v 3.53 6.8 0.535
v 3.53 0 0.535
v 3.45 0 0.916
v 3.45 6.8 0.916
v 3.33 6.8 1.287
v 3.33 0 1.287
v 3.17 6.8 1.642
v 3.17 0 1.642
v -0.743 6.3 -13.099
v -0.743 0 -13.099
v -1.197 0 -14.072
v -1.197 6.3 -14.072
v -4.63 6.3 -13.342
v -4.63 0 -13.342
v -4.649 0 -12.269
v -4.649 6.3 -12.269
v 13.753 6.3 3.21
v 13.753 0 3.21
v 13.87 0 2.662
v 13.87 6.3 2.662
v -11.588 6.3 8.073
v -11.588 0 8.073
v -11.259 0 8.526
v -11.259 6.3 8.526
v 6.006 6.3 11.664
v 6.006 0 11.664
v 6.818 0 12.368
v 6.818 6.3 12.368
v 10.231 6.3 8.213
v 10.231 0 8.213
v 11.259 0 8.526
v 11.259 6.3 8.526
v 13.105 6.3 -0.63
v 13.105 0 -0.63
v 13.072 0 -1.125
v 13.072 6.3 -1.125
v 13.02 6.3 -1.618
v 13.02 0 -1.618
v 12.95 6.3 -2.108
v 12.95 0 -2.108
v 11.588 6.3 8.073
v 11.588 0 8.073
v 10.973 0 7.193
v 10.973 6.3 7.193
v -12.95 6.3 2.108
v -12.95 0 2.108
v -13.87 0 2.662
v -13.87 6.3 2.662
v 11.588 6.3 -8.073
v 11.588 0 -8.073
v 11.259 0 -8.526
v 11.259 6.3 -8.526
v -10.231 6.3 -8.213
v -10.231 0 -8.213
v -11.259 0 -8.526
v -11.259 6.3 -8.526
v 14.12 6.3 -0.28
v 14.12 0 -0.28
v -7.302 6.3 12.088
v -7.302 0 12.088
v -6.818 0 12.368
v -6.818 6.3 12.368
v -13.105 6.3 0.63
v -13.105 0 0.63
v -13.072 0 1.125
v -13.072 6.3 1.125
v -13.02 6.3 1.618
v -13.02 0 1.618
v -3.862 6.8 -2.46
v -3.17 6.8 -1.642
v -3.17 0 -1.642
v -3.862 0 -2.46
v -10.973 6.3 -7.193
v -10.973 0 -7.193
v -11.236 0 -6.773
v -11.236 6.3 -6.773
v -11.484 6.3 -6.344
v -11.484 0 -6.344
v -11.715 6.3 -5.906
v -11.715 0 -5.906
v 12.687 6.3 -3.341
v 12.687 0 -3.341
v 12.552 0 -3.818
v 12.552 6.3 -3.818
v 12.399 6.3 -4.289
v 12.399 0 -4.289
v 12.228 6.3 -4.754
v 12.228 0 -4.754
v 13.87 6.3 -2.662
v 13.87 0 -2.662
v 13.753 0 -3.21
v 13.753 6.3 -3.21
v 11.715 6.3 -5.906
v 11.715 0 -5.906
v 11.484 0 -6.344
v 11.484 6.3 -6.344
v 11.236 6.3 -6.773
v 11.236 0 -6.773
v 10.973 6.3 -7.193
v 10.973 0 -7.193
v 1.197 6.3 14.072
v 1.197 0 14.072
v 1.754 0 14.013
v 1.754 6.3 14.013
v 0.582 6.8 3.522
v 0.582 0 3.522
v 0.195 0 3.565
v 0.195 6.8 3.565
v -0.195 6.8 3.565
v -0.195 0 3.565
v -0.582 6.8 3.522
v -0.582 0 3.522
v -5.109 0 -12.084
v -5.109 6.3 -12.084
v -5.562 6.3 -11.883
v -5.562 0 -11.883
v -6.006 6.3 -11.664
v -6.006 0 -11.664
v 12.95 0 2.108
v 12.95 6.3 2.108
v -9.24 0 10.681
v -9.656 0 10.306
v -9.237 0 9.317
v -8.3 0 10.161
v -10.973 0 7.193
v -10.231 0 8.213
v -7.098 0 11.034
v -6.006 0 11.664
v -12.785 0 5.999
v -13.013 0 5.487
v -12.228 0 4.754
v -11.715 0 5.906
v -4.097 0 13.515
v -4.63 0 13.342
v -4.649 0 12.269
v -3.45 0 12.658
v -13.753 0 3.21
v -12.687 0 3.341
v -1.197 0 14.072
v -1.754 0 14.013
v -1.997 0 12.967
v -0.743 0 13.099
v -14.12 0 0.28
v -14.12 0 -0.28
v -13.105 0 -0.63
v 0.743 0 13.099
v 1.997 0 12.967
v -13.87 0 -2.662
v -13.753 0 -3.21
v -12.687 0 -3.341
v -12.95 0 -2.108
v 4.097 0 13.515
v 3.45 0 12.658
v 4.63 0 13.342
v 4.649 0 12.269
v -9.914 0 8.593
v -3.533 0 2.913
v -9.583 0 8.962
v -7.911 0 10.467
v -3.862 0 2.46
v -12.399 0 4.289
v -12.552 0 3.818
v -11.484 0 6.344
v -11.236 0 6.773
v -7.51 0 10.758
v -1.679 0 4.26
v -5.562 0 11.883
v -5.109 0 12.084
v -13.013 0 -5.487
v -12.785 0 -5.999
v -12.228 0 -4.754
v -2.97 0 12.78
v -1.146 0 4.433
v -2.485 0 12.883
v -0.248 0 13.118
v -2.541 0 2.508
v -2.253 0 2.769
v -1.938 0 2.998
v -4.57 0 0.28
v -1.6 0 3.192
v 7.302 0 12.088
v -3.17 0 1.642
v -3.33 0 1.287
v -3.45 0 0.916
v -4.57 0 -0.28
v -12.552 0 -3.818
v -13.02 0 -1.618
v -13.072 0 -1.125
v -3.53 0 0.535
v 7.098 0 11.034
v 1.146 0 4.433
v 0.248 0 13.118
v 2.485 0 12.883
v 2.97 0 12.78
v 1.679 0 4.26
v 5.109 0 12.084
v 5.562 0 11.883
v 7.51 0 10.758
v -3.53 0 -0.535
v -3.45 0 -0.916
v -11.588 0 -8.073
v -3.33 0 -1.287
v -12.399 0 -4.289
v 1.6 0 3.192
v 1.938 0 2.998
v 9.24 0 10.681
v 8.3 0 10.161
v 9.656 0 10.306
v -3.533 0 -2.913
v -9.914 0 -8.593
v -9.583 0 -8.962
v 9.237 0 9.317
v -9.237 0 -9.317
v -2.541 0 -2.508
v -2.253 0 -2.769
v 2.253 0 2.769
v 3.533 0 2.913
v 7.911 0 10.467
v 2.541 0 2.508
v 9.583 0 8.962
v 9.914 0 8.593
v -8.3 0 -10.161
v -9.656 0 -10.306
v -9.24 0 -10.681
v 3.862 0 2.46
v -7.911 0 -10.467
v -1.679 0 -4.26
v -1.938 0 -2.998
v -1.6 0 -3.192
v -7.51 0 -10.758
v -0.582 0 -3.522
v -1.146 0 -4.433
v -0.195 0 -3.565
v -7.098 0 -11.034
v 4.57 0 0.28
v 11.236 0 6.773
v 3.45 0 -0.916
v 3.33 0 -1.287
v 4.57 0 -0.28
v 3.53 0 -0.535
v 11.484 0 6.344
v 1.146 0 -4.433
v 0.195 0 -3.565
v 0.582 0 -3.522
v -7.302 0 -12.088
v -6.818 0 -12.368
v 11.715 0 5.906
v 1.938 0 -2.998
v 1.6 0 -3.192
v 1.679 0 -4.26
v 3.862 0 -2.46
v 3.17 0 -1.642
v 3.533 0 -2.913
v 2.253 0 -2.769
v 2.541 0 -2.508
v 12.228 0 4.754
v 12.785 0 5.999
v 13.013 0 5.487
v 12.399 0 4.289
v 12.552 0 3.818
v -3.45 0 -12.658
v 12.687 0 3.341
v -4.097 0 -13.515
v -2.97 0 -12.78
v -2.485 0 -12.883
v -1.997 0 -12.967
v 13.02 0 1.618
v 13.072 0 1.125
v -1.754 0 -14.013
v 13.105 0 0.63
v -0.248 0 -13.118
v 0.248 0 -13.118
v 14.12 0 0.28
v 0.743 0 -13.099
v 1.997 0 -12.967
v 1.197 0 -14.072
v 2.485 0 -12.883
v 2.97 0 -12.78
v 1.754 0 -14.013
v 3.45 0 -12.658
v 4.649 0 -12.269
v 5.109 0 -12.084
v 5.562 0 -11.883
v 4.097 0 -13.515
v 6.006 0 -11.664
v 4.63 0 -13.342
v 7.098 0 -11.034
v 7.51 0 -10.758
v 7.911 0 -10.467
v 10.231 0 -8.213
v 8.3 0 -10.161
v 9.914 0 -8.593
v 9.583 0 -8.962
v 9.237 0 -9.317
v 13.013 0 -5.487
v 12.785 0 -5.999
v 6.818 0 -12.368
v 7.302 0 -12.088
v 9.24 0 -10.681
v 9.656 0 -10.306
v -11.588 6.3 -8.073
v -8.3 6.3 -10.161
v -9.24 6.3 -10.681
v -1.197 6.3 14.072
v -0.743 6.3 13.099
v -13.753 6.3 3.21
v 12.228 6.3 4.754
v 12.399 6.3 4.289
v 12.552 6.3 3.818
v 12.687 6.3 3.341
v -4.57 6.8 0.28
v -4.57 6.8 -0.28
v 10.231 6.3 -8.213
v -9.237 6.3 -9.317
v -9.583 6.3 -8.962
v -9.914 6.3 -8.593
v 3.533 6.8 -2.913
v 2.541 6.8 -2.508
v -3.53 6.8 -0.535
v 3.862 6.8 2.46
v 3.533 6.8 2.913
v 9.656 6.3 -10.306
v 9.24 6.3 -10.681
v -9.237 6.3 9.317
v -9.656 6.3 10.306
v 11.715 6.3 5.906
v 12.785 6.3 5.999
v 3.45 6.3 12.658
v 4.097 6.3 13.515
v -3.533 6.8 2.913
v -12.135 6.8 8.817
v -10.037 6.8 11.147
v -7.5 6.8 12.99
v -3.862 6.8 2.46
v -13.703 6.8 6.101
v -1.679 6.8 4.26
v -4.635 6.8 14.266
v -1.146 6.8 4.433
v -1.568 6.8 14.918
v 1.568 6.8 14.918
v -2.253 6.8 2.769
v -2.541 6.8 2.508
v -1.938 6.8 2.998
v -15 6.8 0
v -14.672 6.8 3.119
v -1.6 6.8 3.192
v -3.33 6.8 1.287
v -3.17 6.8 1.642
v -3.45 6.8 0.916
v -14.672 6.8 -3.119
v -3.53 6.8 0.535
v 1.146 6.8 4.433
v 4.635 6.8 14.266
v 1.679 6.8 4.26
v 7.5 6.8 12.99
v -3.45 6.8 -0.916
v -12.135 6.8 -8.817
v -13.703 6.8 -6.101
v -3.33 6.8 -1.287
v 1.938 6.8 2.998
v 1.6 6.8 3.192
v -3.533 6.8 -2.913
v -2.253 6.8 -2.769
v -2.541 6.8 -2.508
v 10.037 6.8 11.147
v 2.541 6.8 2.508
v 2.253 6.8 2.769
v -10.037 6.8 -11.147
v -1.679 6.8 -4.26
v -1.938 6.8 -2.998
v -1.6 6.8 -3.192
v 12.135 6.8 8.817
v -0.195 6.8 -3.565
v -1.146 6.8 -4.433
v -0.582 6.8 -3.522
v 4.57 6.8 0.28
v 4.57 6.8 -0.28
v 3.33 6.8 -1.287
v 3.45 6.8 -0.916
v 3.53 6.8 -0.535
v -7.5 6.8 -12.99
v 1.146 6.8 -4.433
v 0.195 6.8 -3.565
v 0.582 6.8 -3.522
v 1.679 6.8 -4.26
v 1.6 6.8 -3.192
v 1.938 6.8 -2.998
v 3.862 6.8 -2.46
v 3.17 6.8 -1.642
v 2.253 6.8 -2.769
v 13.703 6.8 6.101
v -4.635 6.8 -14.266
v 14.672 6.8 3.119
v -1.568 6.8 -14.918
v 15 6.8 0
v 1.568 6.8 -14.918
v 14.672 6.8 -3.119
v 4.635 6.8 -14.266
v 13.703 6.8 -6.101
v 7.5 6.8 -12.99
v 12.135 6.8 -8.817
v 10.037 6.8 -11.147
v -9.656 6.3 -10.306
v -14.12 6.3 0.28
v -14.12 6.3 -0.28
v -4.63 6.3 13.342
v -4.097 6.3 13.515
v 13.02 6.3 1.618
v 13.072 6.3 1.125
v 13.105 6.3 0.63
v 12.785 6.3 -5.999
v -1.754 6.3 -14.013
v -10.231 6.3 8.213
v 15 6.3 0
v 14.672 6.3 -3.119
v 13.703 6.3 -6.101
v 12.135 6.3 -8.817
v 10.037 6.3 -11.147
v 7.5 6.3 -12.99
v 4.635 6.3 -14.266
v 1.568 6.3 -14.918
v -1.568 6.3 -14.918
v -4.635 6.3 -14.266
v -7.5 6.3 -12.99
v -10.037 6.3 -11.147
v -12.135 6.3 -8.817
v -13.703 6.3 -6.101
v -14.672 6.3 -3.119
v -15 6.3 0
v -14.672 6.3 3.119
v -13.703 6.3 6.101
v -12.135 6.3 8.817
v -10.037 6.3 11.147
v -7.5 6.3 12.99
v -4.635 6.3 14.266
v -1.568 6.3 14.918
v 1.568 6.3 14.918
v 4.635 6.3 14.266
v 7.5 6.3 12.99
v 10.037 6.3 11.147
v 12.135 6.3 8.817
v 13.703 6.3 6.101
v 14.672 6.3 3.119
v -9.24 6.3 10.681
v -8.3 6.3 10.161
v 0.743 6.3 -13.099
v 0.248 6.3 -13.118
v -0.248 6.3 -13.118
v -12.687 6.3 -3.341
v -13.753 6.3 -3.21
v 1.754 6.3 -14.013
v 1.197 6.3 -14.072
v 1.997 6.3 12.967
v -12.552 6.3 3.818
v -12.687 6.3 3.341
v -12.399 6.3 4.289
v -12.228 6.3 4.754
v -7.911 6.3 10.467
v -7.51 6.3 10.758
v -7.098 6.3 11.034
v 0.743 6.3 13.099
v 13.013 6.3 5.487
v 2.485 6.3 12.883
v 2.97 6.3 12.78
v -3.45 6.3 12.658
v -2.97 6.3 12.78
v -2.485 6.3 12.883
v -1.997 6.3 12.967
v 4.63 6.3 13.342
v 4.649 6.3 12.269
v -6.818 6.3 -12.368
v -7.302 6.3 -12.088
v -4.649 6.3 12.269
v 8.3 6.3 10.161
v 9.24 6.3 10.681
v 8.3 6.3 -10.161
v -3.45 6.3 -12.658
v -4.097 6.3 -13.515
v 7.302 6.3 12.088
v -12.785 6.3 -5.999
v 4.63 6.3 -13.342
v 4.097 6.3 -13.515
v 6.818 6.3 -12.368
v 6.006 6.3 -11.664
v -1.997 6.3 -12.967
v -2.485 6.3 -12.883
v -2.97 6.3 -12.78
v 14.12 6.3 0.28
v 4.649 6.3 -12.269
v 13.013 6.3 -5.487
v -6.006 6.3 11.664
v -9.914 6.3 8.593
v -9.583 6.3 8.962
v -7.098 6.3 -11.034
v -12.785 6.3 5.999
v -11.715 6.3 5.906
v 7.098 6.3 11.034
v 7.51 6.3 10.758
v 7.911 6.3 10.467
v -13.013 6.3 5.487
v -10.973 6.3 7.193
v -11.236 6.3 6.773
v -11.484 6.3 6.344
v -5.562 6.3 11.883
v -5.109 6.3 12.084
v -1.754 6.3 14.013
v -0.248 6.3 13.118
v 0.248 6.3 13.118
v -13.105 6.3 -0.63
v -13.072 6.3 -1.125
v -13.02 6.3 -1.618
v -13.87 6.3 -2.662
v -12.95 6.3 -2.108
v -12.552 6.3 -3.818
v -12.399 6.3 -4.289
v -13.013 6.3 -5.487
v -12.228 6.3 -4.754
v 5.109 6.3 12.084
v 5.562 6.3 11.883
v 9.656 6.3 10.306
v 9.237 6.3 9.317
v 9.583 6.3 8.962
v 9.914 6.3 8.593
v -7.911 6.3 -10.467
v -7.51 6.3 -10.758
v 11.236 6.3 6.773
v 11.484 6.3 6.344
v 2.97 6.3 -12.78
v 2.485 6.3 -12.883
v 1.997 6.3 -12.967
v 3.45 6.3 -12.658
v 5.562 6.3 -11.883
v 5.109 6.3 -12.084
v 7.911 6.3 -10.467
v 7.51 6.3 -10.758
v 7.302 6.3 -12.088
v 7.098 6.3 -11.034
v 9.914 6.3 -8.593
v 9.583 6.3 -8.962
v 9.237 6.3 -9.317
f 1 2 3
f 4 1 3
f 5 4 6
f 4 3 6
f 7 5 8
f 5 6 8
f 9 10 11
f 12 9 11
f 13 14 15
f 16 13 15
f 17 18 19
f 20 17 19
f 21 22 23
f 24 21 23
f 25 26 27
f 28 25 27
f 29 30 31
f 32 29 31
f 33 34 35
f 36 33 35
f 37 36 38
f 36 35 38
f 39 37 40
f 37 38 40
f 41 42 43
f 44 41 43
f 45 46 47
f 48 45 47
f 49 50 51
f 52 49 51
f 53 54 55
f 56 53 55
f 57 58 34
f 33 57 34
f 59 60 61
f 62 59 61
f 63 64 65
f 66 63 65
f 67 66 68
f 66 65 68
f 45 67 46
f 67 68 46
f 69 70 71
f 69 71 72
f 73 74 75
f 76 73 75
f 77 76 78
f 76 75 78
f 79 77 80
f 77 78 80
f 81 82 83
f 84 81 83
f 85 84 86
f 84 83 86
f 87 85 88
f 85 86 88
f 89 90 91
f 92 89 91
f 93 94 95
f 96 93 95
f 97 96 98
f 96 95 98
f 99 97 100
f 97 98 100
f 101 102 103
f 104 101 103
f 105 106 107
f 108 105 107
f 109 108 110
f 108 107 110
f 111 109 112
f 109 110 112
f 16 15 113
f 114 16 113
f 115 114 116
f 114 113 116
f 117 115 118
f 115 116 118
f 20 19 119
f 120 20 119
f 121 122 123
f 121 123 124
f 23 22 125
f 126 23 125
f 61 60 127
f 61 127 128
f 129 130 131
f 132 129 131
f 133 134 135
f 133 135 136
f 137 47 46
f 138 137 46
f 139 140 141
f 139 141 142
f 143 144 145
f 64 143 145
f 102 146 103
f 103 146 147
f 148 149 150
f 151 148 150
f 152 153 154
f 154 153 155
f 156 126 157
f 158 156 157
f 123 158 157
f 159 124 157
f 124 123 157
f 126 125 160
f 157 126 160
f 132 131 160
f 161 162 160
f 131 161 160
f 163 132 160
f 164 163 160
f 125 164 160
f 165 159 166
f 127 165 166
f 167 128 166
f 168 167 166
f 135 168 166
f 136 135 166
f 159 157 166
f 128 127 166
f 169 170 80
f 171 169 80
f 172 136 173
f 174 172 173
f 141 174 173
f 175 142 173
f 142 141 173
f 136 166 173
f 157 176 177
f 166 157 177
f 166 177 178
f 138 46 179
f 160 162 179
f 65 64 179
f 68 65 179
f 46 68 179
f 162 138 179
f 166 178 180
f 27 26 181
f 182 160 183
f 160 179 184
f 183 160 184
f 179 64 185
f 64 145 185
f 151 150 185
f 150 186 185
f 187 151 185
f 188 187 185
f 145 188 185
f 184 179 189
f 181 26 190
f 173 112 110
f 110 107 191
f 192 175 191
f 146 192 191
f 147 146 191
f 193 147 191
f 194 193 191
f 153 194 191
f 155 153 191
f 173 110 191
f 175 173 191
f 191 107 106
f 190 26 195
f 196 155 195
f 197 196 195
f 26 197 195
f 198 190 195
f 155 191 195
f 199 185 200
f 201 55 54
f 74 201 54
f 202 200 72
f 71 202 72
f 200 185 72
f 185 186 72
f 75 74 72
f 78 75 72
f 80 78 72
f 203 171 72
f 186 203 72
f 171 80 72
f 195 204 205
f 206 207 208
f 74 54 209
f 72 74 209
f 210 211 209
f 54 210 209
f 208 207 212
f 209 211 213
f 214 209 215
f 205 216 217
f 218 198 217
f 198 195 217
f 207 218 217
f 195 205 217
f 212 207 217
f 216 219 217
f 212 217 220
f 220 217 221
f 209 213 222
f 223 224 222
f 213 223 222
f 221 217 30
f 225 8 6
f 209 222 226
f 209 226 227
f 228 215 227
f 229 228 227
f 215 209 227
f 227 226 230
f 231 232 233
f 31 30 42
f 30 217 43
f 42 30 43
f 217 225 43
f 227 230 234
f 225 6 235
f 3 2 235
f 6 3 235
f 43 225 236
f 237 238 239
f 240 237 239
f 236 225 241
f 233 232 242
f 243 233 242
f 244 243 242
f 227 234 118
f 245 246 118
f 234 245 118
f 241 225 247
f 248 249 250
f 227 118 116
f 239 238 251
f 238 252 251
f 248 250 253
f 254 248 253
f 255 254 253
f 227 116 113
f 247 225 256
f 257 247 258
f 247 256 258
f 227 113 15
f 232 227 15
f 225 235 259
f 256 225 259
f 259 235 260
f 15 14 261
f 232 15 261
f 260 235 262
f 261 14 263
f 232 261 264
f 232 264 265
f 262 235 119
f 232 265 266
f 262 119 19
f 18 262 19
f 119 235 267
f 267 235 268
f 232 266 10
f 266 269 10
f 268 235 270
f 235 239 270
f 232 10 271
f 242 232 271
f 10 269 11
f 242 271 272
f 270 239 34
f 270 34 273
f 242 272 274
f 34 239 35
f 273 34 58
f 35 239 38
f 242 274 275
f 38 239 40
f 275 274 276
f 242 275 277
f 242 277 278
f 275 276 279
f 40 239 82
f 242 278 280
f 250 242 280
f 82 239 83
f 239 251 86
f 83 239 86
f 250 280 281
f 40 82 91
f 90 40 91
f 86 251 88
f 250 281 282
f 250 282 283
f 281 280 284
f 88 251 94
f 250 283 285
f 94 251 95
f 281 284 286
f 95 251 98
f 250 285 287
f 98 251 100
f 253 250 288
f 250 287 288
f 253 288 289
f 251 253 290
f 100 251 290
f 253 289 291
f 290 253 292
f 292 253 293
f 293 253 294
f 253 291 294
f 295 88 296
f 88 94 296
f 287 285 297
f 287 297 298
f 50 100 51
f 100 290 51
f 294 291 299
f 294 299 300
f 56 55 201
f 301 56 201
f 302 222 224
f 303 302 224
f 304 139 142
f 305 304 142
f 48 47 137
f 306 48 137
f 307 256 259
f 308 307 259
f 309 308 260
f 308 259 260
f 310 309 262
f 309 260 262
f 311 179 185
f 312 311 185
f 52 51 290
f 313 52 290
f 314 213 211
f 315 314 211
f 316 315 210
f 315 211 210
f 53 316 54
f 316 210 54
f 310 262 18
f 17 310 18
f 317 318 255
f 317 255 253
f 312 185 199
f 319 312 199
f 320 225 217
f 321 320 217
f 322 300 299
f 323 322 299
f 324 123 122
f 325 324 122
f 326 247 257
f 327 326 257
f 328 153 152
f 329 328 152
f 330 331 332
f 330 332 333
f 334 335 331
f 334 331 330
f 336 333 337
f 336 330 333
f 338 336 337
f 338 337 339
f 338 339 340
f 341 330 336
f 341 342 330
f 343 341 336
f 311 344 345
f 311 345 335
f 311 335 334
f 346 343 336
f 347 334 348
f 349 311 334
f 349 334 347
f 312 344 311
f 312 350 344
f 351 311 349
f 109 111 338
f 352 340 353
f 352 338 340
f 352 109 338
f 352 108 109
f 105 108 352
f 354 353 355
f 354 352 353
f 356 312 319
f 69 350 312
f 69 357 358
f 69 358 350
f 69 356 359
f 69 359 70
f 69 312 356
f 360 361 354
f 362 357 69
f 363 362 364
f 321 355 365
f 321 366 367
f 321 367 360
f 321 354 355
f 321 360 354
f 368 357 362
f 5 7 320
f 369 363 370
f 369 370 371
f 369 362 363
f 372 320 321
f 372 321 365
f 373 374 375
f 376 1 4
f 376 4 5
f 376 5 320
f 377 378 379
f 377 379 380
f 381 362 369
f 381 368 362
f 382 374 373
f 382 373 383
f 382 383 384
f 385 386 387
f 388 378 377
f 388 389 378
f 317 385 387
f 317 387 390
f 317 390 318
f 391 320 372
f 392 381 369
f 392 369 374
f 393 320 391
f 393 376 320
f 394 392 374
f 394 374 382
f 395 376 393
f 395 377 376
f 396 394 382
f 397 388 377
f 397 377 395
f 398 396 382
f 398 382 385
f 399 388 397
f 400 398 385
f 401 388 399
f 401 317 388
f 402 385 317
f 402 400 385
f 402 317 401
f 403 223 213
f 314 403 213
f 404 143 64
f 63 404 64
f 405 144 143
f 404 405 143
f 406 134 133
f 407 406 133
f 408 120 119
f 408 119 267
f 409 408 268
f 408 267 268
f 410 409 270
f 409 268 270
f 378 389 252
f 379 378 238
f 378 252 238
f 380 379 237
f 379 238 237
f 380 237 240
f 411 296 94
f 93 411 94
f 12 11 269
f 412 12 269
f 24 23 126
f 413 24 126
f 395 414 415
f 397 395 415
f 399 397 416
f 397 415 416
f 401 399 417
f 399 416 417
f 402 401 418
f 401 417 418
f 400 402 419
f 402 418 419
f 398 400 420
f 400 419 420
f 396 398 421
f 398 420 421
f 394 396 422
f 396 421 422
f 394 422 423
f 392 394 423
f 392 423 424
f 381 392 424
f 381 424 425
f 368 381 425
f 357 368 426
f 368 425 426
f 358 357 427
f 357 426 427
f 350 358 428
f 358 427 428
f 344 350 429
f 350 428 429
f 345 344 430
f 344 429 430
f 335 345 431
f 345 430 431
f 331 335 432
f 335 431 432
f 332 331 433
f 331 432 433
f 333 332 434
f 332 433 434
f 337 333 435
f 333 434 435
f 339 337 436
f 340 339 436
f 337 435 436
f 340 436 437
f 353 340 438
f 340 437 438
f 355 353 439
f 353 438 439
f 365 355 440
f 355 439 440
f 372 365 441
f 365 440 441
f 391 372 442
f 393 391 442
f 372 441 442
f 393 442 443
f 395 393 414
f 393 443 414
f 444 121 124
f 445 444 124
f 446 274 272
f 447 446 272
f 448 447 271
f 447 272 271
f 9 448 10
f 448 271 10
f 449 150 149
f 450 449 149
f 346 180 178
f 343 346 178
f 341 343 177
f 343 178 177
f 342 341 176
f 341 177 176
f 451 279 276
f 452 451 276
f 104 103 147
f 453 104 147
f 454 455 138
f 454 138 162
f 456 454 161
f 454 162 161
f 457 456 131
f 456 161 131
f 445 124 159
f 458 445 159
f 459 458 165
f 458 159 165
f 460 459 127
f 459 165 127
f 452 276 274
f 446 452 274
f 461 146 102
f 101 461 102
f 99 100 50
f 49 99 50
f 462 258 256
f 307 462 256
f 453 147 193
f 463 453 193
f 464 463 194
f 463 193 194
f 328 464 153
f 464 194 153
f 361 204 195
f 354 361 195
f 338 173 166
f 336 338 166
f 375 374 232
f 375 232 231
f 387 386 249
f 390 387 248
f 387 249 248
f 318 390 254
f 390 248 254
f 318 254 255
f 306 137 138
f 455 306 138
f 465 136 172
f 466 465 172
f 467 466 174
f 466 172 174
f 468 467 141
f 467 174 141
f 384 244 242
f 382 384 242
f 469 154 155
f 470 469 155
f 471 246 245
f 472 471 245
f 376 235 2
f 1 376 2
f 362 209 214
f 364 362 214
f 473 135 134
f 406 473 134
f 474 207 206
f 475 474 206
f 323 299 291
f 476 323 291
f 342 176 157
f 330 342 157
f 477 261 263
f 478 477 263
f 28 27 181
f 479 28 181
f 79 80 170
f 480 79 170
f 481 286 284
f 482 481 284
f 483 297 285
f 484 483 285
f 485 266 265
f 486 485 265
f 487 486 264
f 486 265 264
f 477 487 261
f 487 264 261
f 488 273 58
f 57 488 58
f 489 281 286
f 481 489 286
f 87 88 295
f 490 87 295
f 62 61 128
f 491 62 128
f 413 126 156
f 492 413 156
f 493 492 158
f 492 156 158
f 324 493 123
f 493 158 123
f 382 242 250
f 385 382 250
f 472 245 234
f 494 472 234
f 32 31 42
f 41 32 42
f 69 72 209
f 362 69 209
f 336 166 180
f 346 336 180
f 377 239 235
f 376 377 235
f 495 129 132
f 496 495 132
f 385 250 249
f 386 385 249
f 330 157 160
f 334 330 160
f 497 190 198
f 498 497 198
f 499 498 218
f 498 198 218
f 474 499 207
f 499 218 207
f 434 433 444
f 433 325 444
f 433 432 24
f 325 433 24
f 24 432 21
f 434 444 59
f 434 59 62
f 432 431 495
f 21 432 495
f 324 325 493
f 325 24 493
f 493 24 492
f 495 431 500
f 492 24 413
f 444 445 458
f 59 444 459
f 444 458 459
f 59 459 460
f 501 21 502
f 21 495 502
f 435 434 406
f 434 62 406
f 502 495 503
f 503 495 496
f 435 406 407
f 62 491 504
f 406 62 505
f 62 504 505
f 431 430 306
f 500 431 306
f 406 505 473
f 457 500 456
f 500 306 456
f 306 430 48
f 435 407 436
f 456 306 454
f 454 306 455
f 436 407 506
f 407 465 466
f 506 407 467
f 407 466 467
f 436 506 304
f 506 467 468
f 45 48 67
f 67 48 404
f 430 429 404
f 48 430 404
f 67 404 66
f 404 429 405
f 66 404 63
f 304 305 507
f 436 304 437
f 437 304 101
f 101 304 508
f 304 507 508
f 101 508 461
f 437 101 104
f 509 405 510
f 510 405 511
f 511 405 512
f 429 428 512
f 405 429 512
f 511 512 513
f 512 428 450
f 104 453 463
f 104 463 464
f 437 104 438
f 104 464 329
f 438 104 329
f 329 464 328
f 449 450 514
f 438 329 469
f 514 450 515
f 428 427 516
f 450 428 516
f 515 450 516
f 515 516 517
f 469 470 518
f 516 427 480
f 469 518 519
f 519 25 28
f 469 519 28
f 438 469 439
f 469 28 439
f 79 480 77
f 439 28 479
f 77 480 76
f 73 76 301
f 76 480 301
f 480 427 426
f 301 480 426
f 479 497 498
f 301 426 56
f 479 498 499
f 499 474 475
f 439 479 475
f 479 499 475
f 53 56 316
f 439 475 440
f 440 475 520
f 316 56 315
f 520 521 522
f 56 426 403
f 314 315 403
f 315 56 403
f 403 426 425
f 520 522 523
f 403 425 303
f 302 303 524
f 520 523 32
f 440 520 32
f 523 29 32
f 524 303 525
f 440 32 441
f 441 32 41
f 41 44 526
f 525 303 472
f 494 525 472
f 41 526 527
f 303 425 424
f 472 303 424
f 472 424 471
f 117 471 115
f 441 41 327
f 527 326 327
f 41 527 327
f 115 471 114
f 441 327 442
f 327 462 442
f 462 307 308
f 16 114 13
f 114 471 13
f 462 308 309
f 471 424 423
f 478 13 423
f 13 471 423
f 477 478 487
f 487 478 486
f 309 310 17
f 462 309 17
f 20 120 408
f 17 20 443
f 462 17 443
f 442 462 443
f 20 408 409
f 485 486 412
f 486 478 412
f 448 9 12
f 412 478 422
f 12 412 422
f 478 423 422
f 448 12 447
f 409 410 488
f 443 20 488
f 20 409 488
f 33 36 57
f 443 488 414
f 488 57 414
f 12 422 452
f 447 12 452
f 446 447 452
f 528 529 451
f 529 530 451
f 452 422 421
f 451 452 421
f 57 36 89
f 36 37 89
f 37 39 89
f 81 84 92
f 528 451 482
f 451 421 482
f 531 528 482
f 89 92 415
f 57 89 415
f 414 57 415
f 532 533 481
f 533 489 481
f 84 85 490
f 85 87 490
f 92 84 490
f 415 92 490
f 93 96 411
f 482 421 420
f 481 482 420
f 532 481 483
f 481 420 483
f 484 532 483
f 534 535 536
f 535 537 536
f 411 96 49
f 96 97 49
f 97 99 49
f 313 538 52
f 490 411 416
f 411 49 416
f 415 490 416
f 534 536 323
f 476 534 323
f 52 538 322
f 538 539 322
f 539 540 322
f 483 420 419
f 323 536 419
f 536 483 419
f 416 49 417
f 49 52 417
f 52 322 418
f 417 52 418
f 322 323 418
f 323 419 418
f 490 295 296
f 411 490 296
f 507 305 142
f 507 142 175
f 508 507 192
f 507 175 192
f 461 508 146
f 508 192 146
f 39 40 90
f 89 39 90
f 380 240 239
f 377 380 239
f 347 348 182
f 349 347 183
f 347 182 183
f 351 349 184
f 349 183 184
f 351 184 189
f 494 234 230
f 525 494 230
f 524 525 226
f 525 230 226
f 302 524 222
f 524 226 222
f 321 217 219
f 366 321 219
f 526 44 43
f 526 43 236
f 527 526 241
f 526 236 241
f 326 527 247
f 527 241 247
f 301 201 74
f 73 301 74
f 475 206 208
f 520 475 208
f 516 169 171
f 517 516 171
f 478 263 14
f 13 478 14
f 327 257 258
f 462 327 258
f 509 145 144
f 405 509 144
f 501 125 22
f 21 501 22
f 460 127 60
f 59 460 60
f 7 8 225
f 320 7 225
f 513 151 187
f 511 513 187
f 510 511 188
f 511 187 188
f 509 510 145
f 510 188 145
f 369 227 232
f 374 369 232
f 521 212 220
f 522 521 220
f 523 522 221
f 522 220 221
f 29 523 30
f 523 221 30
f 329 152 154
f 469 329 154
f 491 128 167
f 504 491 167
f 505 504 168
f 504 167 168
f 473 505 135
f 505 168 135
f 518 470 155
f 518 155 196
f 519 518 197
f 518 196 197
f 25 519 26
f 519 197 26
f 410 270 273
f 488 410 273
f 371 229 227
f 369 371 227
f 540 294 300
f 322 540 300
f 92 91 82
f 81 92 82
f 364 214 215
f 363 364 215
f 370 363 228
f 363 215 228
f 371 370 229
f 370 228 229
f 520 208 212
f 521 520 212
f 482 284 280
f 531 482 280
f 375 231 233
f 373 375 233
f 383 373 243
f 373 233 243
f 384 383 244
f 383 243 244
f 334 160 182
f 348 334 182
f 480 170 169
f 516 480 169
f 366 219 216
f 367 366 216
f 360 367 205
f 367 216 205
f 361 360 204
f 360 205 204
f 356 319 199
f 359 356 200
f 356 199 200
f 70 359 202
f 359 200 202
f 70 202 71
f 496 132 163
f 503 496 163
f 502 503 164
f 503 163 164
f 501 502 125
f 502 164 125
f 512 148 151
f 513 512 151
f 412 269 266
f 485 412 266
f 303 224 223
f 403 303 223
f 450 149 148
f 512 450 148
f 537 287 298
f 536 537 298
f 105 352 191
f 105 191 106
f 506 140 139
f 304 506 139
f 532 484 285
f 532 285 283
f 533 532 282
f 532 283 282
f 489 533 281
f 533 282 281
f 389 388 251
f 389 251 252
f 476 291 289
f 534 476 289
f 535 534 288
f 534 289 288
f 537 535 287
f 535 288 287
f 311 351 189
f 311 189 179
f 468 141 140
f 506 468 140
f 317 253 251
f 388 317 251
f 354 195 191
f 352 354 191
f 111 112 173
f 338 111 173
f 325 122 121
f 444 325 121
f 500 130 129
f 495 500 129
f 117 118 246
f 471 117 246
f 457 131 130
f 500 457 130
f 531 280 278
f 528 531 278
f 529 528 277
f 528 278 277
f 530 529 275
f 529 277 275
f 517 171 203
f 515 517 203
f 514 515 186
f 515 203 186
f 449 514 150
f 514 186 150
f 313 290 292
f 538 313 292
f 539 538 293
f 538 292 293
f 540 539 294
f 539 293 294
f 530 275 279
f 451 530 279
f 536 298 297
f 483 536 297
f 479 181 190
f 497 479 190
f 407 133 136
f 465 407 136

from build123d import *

# Parameters (mm, degrees)
BOSS_EXTRUDE1_DEPTH = 6.3
CIRPATTERN1_COUNT   = 30
SKETCH2_R           = 15
BOSS_EXTRUDE2_DEPTH = 0.5
CUT_EXTRUDE2_DEPTH  = 7.8
CIRPATTERN2_COUNT   = 10


with BuildPart() as part:
    # Sketch1 → Boss-Extrude1 (new body)
    with BuildSketch(Plane(origin=(0, 0, 0), x_dir=(1, 0, 0), z_dir=(0, 1, 0))):
        with BuildLine():
            ThreePointArc((13.104844929, 0.630427946), (-13.12, 0), (13.104844929, -0.630427946))
            Line((13.104844929, -0.630427946), (12.849932635, -0.718422769))
            ThreePointArc((12.849932635, -0.718422769), (12.87, 0), (12.849932635, 0.718422769))
            Line((12.849932635, 0.718422769), (13.104844929, 0.630427946))
        make_face()
        with BuildLine():
            Line((12.849932635, -0.718422769), (13.104844929, -0.630427946))
            ThreePointArc((13.104844929, -0.630427946), (13.116210685, -0.315305039), (13.12, 0))
            ThreePointArc((13.12, 0), (13.116210685, 0.315305039), (13.104844929, 0.630427946))
            Line((13.104844929, 0.630427946), (12.849932635, 0.718422769))
            ThreePointArc((12.849932635, 0.718422769), (12.87, 0), (12.849932635, -0.718422769))
        make_face()
        with BuildLine():
            Line((14.12, -0.28), (14.12, 0))
            Line((14.12, 0), (14.12, 0.28))
            Line((14.12, 0.28), (13.104844929, 0.630427946))
            ThreePointArc((13.104844929, 0.630427946), (13.116210685, 0.315305039), (13.12, 0))
            ThreePointArc((13.12, 0), (13.116210685, -0.315305039), (13.104844929, -0.630427946))
            Line((13.104844929, -0.630427946), (14.12, -0.28))
        make_face()
    boss_extrude1 = extrude(amount=BOSS_EXTRUDE1_DEPTH)

    # CirPattern1: Boss-Extrude1 ×30 about axis
    cirpattern1_axis = Axis((0, 0, 0), (0, 1, 0))
    for i in range(1, CIRPATTERN1_COUNT):
        add(boss_extrude1.rotate(cirpattern1_axis, i * 360 / CIRPATTERN1_COUNT))

    # Sketch2 → Boss-Extrude2 (add)
    with BuildSketch(Plane(origin=(0, 6.3, 0), x_dir=(1, 0, 0), z_dir=(0, 1, 0))):
        Circle(SKETCH2_R)
    extrude(amount=BOSS_EXTRUDE2_DEPTH)

    # Sketch5 → Cut-Extrude2 (cut, through all)
    with BuildSketch(Plane.XZ):
        with BuildLine():
            ThreePointArc((3.529675716, 0.535060126), (-3.57, 0), (3.529675716, -0.535060126))
            Line((3.529675716, -0.535060126), (3.265358075, -0.599863853))
            ThreePointArc((3.265358075, -0.599863853), (3.32, 0), (3.265358075, 0.599863853))
            Line((3.265358075, 0.599863853), (3.529675716, 0.535060126))
        make_face()
        with BuildLine():
            Line((3.265358075, -0.599863853), (3.529675716, -0.535060126))
            ThreePointArc((3.529675716, -0.535060126), (3.559904655, -0.268288737), (3.57, 0))
            ThreePointArc((3.57, 0), (3.559904655, 0.268288737), (3.529675716, 0.535060126))
            Line((3.529675716, 0.535060126), (3.265358075, 0.599863853))
            ThreePointArc((3.265358075, 0.599863853), (3.32, 0), (3.265358075, -0.599863853))
        make_face()
        with BuildLine():
            Line((4.57, -0.28), (4.57, 0))
            Line((4.57, 0), (4.57, 0.28))
            Line((4.57, 0.28), (3.529675716, 0.535060126))
            ThreePointArc((3.529675716, 0.535060126), (3.559904655, 0.268288737), (3.57, 0))
            ThreePointArc((3.57, 0), (3.559904655, -0.268288737), (3.529675716, -0.535060126))
            Line((3.529675716, -0.535060126), (4.57, -0.28))
        make_face()
    cut_extrude2 = extrude(amount=-CUT_EXTRUDE2_DEPTH, mode=Mode.SUBTRACT)

    # CirPattern2: Cut-Extrude2 ×10 about axis
    cirpattern2_axis = Axis((0, 0, 0), (0, 1, 0))
    for i in range(1, CIRPATTERN2_COUNT):
        add(cut_extrude2.rotate(cirpattern2_axis, i * 360 / CIRPATTERN2_COUNT), mode=Mode.SUBTRACT)


solid = part.part
